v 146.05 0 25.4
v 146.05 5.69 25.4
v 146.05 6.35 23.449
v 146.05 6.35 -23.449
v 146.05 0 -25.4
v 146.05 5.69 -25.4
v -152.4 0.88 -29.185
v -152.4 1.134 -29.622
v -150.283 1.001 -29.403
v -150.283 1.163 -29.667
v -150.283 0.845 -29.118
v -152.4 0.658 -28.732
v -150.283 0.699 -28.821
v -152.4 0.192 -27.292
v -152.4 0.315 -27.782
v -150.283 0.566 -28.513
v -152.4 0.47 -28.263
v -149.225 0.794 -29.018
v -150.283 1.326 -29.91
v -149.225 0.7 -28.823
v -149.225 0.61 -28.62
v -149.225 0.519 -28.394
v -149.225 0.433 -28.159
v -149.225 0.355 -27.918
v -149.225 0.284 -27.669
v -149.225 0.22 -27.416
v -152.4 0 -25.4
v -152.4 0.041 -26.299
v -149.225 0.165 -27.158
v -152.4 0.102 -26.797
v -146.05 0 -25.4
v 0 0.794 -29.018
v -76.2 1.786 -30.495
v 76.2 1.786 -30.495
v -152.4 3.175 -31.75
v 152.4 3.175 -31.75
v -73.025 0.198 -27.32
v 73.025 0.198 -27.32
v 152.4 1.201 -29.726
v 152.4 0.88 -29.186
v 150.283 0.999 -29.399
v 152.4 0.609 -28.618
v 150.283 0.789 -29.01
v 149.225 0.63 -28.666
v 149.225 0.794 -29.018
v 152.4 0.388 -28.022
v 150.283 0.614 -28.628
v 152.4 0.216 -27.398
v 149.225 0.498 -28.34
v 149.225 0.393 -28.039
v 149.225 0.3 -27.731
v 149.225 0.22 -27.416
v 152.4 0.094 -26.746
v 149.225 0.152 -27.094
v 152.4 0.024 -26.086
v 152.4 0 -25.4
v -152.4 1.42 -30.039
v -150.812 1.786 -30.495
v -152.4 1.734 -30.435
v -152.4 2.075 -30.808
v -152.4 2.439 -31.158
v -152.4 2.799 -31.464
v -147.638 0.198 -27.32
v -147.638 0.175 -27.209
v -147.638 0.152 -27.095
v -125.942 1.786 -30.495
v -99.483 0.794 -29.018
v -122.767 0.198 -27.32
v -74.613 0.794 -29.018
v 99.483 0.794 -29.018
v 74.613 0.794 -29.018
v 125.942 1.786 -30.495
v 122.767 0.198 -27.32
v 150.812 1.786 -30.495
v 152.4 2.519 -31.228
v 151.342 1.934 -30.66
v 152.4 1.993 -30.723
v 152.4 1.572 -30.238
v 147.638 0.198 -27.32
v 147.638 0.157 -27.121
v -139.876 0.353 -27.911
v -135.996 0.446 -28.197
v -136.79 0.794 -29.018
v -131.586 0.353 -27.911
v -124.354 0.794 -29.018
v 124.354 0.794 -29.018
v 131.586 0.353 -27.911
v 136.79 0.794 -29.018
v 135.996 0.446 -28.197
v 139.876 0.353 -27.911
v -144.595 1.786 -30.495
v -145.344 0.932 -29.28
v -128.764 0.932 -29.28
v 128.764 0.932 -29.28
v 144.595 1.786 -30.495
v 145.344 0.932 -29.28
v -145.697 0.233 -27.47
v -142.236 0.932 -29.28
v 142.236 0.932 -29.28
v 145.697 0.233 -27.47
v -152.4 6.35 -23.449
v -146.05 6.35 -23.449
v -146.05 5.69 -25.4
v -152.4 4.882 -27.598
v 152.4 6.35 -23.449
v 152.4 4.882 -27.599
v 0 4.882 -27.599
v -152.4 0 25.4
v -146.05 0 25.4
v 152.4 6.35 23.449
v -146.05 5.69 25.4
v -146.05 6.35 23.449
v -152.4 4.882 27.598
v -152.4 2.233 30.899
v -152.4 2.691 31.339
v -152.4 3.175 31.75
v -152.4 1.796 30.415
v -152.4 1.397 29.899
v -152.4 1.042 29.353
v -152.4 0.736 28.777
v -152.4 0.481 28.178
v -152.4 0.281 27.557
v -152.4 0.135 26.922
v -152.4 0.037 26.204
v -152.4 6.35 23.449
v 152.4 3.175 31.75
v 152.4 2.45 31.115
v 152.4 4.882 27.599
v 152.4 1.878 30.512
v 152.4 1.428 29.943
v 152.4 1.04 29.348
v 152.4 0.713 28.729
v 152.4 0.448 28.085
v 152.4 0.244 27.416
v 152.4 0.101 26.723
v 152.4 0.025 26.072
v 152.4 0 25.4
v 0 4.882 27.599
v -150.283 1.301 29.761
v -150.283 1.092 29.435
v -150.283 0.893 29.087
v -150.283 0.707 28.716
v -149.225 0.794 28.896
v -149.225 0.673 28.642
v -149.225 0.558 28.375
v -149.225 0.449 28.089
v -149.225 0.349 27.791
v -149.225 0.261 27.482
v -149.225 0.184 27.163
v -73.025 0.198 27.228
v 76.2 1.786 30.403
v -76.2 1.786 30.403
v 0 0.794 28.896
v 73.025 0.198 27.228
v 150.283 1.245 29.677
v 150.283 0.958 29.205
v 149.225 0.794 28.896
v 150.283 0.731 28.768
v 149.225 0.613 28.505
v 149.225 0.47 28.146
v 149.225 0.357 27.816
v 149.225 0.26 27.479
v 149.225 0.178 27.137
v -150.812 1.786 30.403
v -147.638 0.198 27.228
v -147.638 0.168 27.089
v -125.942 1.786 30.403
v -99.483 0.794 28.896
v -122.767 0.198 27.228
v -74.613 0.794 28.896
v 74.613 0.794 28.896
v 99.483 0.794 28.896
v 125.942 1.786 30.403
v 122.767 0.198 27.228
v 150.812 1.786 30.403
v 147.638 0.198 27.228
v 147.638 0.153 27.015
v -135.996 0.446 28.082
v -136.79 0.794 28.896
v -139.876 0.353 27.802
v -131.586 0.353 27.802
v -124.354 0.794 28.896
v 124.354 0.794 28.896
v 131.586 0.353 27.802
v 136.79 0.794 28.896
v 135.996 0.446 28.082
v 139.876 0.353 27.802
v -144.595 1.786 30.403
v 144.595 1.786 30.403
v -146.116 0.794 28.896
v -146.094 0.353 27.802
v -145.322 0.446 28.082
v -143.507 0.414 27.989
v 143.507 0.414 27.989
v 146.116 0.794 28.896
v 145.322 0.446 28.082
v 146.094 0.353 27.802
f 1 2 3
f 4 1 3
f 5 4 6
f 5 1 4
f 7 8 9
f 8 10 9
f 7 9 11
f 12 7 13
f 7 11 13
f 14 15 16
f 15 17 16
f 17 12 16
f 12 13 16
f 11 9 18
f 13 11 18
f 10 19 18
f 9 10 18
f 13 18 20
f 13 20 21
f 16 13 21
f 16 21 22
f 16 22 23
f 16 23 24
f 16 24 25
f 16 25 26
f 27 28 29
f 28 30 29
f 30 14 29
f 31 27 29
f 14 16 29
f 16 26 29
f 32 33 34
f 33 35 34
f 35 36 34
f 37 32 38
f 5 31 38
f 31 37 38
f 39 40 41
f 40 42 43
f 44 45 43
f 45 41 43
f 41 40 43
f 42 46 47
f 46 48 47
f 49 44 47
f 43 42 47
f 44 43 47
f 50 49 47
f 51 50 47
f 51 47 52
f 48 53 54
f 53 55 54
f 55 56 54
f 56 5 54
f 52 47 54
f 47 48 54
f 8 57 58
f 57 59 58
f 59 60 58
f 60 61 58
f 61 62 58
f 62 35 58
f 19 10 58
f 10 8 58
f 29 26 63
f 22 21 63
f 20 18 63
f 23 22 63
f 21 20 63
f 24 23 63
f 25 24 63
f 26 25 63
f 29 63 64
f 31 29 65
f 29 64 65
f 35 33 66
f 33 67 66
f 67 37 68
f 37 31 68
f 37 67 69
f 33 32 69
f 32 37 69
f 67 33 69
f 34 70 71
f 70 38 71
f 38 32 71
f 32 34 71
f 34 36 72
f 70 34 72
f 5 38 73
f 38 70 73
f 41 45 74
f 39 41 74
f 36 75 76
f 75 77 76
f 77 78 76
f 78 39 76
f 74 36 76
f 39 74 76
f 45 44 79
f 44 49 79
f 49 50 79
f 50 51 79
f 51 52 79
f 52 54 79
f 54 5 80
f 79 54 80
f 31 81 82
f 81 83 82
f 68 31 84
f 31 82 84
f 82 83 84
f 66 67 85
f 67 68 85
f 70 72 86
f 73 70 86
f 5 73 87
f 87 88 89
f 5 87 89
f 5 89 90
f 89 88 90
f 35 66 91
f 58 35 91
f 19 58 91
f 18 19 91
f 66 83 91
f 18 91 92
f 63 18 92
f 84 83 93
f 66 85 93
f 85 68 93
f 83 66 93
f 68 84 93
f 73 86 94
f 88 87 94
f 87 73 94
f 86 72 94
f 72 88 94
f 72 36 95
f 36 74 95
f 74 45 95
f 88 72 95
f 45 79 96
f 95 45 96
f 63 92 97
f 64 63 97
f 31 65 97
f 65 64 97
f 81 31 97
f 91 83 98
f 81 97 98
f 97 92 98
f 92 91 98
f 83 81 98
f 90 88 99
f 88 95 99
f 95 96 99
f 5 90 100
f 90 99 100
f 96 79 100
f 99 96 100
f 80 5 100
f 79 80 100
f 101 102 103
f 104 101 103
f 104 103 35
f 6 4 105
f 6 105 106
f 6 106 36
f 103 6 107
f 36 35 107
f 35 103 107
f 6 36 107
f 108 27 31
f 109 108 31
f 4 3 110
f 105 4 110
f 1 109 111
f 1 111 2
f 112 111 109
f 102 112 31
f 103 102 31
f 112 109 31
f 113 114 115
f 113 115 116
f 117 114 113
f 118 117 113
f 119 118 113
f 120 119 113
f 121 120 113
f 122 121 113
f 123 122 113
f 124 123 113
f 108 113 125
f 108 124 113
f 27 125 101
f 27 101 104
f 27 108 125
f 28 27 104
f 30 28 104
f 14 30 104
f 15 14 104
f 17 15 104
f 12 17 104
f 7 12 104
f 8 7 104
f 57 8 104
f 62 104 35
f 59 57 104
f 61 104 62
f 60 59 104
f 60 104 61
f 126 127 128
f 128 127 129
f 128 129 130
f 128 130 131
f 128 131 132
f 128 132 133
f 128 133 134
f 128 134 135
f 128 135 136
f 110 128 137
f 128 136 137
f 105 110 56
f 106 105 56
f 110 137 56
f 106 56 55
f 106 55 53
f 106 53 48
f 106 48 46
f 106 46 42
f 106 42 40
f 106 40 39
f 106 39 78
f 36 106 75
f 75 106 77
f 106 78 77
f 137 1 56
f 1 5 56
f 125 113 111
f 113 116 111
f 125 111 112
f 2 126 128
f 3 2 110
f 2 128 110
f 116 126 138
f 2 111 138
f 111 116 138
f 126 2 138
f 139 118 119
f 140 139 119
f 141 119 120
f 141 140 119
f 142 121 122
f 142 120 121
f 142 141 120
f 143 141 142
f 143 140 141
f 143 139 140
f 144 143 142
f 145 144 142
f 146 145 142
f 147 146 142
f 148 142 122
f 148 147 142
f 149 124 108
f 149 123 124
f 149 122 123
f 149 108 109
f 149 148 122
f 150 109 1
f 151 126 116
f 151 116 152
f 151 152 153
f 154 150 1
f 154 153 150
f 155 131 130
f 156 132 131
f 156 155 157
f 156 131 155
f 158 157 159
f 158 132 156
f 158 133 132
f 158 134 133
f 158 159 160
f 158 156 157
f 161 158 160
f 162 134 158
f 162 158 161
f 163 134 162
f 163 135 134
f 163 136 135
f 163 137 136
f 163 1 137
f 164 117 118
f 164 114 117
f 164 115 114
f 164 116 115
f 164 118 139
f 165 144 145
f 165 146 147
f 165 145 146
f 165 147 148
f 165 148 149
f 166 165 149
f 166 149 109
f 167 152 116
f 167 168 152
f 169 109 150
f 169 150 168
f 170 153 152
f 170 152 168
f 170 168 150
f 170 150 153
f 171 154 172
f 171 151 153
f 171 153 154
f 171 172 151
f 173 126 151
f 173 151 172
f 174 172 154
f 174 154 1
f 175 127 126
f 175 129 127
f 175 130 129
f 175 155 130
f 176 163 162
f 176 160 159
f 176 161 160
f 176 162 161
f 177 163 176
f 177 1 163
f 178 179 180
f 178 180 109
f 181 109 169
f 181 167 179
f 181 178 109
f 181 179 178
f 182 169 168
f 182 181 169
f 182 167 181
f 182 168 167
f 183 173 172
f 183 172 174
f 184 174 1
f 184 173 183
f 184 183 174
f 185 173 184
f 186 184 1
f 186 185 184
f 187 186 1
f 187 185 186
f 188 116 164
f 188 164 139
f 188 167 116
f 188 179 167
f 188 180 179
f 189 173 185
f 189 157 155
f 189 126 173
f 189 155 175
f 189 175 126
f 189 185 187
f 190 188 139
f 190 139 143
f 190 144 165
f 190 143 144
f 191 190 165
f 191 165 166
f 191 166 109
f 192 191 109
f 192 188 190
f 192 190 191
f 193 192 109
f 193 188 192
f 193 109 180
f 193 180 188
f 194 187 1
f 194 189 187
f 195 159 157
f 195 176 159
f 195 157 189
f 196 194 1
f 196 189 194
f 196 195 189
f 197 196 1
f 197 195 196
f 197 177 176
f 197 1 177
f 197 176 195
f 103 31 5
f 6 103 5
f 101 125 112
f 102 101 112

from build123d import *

# Parameters (mm, degrees)
SKETCH2_W           = 304.8
SKETCH2_H           = 63.5
SKETCH2_W_2         = 292.1
SKETCH2_H_2         = 50.8
BOSS_EXTRUDE1_DEPTH = 6.35
CUT_EXTRUDE1_DEPTH  = 305.8


with BuildPart() as part:
    # Sketch2 → Boss-Extrude1 (new body)
    with BuildSketch(Plane(origin=(0, 0, 0), x_dir=(1, 0, 0), z_dir=(0, 1, 0))):
        Rectangle(SKETCH2_W, SKETCH2_H)
        Rectangle(SKETCH2_W_2, SKETCH2_H_2, mode=Mode.SUBTRACT)
    extrude(amount=BOSS_EXTRUDE1_DEPTH)

    # Sketch3 → Cut-Extrude1 (cut, through all)
    with BuildSketch(Plane(origin=(152.4, 0, 0), x_dir=(0, 0, -1), z_dir=(1, 0, 0))):
        with BuildLine():
            Line((-25.4, 0), (-25.4, -8.736367268))
            Line((-25.4, -8.736367268), (-38.728215981, -8.736367268))
            Line((-38.728215981, -8.736367268), (-38.728215981, 15.541993339))
            Line((-38.728215981, 15.541993339), (38.923484297, 15.541993339))
            Line((38.923484297, 15.541993339), (38.923484297, -8.736367268))
            Line((38.923484297, -8.736367268), (25.4, -8.736367268))
            Line((25.4, -8.736367268), (25.4, 0))
            add(Edge.make_bspline(
                [(31.75, 3.175), (29.461898019, 0), (25.4, 0)],
                knots=[0, 0, 0, 1, 1, 1], degree=2))
            add(Edge.make_bspline(
                [(-31.75, 3.175), (0, 17.145), (31.75, 3.175)],
                knots=[0, 0, 0, 1, 1, 1], degree=2))
            add(Edge.make_bspline(
                [(-31.75, 3.175), (-29.216649895, 0), (-25.4, 0)],
                knots=[0, 0, 0, 1, 1, 1], degree=2))
        make_face()
    extrude(amount=-CUT_EXTRUDE1_DEPTH, mode=Mode.SUBTRACT)


solid = part.part
